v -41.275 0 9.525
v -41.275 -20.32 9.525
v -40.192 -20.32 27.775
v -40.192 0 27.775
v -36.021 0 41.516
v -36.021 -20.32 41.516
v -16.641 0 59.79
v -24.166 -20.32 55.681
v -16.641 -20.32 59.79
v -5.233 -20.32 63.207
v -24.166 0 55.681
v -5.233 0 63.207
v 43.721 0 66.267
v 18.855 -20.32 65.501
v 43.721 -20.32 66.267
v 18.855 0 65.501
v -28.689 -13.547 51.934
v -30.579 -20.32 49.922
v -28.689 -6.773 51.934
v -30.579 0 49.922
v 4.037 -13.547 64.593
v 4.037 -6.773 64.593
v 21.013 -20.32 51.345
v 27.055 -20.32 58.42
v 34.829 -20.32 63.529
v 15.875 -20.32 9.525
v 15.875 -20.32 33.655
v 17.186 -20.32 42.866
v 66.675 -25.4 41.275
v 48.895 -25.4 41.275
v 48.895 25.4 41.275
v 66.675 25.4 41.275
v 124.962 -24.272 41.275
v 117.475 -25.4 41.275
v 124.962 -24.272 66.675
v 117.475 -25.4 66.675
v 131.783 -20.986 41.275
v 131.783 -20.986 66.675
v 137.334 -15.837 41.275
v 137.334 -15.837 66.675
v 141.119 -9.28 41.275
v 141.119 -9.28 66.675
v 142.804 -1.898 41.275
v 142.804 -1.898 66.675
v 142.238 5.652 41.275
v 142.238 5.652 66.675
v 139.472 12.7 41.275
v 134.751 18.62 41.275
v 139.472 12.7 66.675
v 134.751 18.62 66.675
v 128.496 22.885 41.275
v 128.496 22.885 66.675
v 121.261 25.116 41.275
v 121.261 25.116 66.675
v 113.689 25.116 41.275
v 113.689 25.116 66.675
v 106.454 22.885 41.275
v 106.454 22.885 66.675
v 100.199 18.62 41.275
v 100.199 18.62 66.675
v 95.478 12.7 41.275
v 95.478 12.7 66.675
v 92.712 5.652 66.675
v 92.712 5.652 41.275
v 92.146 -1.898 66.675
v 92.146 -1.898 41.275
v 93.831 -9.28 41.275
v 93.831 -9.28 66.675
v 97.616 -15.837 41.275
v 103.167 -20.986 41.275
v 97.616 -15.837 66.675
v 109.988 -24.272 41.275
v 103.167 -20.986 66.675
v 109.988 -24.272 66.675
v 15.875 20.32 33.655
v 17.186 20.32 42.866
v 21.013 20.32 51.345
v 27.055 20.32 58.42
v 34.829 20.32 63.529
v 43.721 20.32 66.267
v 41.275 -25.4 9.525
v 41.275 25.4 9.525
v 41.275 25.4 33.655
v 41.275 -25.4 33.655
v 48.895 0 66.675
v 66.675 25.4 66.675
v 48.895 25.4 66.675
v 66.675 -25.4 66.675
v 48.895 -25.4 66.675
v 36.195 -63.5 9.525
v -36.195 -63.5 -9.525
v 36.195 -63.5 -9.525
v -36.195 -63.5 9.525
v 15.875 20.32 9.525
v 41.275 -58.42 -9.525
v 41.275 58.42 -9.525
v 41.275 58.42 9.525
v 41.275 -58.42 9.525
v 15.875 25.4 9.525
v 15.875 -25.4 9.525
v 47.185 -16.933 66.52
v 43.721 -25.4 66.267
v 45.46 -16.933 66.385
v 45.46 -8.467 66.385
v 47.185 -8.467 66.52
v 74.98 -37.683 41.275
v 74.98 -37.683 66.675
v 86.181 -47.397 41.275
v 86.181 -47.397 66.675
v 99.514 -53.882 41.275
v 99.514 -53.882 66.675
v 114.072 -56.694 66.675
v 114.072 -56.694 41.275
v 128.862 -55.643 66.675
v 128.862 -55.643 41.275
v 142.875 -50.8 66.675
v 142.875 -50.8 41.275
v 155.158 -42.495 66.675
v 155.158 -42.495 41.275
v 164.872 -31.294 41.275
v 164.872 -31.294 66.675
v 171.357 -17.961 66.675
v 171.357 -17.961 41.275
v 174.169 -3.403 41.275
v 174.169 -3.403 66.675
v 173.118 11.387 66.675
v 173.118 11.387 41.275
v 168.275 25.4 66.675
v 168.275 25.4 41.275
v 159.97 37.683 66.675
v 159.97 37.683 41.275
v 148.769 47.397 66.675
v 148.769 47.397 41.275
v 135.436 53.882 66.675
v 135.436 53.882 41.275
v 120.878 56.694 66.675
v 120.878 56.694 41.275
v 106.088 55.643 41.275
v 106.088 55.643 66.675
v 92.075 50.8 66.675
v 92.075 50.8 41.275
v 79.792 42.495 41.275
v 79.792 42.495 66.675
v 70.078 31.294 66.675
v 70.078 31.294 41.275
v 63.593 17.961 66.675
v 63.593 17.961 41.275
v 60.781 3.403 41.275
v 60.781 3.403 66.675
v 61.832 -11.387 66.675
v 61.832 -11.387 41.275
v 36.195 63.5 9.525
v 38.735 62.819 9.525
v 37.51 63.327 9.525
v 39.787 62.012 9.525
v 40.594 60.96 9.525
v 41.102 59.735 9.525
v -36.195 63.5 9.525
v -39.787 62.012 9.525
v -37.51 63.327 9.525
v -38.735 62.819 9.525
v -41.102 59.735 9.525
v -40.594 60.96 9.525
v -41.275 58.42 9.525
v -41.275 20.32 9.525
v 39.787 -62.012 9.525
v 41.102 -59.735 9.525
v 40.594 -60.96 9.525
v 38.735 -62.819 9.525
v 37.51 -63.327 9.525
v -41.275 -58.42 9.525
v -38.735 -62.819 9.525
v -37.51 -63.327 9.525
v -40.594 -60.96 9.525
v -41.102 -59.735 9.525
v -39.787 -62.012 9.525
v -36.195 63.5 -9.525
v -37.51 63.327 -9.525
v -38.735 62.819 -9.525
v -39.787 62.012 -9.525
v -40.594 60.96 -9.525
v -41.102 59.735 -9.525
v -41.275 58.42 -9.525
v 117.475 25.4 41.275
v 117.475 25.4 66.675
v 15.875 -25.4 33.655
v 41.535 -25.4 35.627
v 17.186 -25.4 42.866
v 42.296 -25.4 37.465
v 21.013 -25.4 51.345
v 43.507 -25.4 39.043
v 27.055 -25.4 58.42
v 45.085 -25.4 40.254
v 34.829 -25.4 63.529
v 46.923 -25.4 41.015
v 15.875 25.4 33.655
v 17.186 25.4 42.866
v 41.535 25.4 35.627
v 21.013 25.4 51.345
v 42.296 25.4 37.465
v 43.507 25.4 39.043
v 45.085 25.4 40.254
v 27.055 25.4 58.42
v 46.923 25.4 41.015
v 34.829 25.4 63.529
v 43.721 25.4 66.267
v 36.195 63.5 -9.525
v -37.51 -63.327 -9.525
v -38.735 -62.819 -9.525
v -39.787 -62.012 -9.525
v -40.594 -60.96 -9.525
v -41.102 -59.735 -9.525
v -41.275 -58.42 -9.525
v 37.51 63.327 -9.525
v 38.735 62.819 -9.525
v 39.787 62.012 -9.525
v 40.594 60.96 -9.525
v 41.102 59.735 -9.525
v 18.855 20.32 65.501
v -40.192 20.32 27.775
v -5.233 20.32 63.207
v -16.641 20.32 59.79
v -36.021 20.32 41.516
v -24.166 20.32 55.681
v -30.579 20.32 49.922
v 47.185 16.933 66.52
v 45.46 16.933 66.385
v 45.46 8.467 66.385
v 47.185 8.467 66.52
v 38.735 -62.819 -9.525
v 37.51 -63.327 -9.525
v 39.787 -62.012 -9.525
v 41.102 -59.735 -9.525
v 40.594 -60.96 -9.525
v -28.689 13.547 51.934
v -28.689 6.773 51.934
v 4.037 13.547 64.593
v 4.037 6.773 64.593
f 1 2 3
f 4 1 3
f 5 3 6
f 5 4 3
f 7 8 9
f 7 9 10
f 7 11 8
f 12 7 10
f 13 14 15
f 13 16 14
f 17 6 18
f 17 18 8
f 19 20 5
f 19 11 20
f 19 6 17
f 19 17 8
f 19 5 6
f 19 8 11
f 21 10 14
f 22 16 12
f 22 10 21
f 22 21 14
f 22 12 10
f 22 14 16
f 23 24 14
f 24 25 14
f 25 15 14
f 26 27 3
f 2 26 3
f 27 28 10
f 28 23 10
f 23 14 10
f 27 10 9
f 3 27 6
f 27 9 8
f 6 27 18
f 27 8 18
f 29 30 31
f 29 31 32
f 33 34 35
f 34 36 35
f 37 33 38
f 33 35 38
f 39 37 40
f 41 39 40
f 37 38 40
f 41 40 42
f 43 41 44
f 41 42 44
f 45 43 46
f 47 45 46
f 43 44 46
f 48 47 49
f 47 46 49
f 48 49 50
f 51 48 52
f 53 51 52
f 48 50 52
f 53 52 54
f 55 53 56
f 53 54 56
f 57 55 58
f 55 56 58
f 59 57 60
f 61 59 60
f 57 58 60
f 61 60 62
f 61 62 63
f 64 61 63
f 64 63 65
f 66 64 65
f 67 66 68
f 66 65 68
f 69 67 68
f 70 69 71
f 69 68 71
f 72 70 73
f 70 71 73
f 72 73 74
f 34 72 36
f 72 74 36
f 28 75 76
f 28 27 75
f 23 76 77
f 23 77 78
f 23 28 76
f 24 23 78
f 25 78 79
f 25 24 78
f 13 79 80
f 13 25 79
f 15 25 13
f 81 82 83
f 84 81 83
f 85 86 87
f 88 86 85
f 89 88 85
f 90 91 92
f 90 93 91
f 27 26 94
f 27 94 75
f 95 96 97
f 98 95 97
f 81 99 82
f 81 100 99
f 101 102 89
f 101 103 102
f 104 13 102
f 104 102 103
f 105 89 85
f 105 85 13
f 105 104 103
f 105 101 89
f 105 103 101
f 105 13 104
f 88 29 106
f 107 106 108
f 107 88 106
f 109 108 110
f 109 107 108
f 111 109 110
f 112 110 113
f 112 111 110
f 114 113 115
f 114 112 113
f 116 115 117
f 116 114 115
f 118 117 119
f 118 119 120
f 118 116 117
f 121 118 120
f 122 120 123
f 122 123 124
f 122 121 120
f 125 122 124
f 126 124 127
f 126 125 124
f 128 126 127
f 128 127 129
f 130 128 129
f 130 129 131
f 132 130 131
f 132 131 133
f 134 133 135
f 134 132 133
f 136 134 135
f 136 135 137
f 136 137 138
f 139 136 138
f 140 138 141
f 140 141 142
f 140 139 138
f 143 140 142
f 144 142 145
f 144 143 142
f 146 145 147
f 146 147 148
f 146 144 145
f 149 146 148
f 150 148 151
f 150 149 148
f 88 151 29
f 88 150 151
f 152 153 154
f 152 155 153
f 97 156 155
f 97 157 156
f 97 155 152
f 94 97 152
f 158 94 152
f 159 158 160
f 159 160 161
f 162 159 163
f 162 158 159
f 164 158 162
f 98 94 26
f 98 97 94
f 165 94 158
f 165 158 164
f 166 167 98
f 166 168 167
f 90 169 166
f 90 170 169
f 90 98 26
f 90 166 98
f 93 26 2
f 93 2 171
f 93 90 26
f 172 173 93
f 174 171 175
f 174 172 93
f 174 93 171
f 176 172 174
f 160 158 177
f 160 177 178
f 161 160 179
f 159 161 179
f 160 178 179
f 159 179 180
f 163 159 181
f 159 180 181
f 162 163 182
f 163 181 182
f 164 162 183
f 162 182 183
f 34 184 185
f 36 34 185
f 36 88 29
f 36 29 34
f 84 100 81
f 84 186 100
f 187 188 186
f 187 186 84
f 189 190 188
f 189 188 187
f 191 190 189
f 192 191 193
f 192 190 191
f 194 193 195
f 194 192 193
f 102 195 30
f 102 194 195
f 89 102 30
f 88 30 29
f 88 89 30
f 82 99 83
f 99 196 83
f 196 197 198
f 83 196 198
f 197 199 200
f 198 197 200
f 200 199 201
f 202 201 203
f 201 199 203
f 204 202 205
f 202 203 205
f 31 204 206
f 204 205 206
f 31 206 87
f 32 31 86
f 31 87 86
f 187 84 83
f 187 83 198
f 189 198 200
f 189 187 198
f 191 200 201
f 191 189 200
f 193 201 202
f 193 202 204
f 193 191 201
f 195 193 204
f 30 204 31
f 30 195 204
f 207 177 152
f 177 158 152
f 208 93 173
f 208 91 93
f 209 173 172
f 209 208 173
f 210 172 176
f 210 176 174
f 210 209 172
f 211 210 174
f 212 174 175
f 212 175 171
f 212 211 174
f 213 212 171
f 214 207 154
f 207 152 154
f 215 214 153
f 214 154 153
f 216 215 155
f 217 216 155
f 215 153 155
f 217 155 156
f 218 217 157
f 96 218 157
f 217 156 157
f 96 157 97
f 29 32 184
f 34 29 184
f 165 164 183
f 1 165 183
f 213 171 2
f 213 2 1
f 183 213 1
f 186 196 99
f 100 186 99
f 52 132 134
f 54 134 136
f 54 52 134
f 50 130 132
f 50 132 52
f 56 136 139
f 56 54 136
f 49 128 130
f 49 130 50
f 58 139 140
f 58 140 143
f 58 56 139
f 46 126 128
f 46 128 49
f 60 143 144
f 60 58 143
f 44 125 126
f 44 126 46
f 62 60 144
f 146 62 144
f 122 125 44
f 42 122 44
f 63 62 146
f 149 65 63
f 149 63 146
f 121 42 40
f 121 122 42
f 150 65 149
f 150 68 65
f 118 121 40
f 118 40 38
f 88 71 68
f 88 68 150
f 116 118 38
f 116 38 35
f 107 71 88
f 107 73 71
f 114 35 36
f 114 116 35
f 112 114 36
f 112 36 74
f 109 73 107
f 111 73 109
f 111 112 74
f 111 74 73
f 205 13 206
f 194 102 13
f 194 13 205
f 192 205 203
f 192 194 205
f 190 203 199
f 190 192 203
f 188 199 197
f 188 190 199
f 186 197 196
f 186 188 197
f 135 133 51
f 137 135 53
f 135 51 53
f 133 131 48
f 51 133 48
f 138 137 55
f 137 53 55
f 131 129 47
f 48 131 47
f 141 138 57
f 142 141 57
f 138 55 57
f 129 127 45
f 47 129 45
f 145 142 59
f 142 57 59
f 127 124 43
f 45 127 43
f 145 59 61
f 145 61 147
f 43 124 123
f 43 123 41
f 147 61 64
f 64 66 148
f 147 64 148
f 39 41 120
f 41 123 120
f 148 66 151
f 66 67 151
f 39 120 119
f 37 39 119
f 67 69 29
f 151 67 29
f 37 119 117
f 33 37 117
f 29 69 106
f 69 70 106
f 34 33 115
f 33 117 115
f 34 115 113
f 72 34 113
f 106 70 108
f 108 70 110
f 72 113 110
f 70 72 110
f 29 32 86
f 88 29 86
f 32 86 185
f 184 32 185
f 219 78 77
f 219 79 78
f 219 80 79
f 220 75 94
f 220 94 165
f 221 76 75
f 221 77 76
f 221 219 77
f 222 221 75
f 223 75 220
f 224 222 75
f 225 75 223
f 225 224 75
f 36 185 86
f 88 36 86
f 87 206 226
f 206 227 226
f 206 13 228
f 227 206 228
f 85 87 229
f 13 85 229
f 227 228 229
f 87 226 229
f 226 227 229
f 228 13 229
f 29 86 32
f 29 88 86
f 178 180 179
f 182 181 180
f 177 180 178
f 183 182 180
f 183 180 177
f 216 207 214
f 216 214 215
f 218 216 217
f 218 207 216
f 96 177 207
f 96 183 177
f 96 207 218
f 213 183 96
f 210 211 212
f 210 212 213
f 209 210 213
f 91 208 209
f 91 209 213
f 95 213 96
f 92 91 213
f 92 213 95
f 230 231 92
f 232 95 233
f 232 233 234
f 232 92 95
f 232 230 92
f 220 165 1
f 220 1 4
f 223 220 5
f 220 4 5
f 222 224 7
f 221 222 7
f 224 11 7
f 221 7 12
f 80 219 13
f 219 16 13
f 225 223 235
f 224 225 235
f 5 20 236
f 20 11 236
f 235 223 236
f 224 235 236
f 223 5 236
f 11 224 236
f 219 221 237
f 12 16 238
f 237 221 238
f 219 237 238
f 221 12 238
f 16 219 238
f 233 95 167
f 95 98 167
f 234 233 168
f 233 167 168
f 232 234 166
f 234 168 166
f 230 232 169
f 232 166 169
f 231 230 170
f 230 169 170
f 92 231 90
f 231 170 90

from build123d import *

# Parameters (mm, degrees)
F1_DEPTH  = 63.5
F2_DEPTH  = 20.32
F3_DEPTH  = 25.4
F4_DEPTH  = 25.4
F5_R      = 5.08
F3_FACE_W = 50.8
F3_FACE_H = 25.4


with BuildPart() as f1:
    # F0 (on Front) → F1 (new body, symmetric)
    with BuildSketch(Plane.XZ):
        Polygon((-41.275, -9.525), (41.275, -9.525), (41.275, 9.525), (15.875, 9.525), (-41.275, 9.525), align=None)
    extrude(amount=F1_DEPTH, both=True)

    # F0 (on Front) → F2 (join, symmetric)
    with BuildSketch(Plane.XZ):
        with BuildLine():
            add(Edge.make_bspline(
                [(-41.275, 9.525), (-43.152439, 73.063829), (4.952169, 63.829557), (43.720809, 66.267086)],
                knots=[0, 0, 0, 0, 102.156244, 102.156244, 102.156244, 102.156244], degree=3))
            Line((-41.275, 9.525), (15.875, 9.525))
            Line((15.875, 9.525), (15.875, 33.655))
            ThreePointArc((15.875, 33.655), (23.783527, 55.096416), (43.720809, 66.267086))
        make_face()
    extrude(amount=F2_DEPTH, both=True)

    # F5
    f5_edges = [f1.edges().sort_by_distance(p)[0] for p in [
        (-41.275, -63.5, 0),
        (41.275, -63.5, 0),
        (41.275, 63.5, 0),
        (-41.275, 63.5, 0),
    ]]
    fillet(f5_edges, radius=F5_R)


with BuildPart() as f3:
    # F0 (on Front) → F3 (new body, symmetric)
    with BuildSketch(Plane.XZ):
        Polygon((66.675, 66.675), (66.675, 41.275), (74.26136, 41.275), (117.475, 41.275), (117.475, 66.675), (74.26136, 66.675), align=None)
    extrude(amount=F3_DEPTH, both=True)


with BuildPart() as f4:
    # F0 (on Front) → F4 (new body, symmetric)
    with BuildSketch(Plane.XZ):
        with BuildLine():
            Line((15.875, 9.525), (41.275, 9.525))
            Line((41.275, 9.525), (41.275, 33.655))
            ThreePointArc((41.275, 33.655), (43.506846, 39.043154), (48.895, 41.275))
            Line((48.895, 41.275), (66.675, 41.275))
            Line((66.675, 41.275), (66.675, 66.675))
            Line((66.675, 66.675), (48.895, 66.675))
            add(Edge.make_bspline(
                [(43.720809, 66.267086), (45.466268, 66.376829), (47.192803, 66.510232), (48.895, 66.675)],
                knots=[102.156244, 102.156244, 102.156244, 102.156244, 106.755568, 106.755568, 106.755568, 106.755568], degree=3))
            ThreePointArc((43.720809, 66.267086), (23.783527, 55.096416), (15.875, 33.655))
            Line((15.875, 33.655), (15.875, 9.525))
        make_face()
    extrude(amount=F4_DEPTH, both=True)


with BuildPart() as f6:
    # F3_face (on face) → F6 (revolve)
    with BuildSketch(Plane(origin=(92.075, -25.4, 53.975), x_dir=(1, 0, 0), z_dir=(0, -1, 0))):
        Rectangle(F3_FACE_W, F3_FACE_H)
    revolve(axis=Axis((117.475, 0, 53.975), (0, 0, 1)))


solid = Compound([f1.part, f3.part, f4.part, f6.part])
